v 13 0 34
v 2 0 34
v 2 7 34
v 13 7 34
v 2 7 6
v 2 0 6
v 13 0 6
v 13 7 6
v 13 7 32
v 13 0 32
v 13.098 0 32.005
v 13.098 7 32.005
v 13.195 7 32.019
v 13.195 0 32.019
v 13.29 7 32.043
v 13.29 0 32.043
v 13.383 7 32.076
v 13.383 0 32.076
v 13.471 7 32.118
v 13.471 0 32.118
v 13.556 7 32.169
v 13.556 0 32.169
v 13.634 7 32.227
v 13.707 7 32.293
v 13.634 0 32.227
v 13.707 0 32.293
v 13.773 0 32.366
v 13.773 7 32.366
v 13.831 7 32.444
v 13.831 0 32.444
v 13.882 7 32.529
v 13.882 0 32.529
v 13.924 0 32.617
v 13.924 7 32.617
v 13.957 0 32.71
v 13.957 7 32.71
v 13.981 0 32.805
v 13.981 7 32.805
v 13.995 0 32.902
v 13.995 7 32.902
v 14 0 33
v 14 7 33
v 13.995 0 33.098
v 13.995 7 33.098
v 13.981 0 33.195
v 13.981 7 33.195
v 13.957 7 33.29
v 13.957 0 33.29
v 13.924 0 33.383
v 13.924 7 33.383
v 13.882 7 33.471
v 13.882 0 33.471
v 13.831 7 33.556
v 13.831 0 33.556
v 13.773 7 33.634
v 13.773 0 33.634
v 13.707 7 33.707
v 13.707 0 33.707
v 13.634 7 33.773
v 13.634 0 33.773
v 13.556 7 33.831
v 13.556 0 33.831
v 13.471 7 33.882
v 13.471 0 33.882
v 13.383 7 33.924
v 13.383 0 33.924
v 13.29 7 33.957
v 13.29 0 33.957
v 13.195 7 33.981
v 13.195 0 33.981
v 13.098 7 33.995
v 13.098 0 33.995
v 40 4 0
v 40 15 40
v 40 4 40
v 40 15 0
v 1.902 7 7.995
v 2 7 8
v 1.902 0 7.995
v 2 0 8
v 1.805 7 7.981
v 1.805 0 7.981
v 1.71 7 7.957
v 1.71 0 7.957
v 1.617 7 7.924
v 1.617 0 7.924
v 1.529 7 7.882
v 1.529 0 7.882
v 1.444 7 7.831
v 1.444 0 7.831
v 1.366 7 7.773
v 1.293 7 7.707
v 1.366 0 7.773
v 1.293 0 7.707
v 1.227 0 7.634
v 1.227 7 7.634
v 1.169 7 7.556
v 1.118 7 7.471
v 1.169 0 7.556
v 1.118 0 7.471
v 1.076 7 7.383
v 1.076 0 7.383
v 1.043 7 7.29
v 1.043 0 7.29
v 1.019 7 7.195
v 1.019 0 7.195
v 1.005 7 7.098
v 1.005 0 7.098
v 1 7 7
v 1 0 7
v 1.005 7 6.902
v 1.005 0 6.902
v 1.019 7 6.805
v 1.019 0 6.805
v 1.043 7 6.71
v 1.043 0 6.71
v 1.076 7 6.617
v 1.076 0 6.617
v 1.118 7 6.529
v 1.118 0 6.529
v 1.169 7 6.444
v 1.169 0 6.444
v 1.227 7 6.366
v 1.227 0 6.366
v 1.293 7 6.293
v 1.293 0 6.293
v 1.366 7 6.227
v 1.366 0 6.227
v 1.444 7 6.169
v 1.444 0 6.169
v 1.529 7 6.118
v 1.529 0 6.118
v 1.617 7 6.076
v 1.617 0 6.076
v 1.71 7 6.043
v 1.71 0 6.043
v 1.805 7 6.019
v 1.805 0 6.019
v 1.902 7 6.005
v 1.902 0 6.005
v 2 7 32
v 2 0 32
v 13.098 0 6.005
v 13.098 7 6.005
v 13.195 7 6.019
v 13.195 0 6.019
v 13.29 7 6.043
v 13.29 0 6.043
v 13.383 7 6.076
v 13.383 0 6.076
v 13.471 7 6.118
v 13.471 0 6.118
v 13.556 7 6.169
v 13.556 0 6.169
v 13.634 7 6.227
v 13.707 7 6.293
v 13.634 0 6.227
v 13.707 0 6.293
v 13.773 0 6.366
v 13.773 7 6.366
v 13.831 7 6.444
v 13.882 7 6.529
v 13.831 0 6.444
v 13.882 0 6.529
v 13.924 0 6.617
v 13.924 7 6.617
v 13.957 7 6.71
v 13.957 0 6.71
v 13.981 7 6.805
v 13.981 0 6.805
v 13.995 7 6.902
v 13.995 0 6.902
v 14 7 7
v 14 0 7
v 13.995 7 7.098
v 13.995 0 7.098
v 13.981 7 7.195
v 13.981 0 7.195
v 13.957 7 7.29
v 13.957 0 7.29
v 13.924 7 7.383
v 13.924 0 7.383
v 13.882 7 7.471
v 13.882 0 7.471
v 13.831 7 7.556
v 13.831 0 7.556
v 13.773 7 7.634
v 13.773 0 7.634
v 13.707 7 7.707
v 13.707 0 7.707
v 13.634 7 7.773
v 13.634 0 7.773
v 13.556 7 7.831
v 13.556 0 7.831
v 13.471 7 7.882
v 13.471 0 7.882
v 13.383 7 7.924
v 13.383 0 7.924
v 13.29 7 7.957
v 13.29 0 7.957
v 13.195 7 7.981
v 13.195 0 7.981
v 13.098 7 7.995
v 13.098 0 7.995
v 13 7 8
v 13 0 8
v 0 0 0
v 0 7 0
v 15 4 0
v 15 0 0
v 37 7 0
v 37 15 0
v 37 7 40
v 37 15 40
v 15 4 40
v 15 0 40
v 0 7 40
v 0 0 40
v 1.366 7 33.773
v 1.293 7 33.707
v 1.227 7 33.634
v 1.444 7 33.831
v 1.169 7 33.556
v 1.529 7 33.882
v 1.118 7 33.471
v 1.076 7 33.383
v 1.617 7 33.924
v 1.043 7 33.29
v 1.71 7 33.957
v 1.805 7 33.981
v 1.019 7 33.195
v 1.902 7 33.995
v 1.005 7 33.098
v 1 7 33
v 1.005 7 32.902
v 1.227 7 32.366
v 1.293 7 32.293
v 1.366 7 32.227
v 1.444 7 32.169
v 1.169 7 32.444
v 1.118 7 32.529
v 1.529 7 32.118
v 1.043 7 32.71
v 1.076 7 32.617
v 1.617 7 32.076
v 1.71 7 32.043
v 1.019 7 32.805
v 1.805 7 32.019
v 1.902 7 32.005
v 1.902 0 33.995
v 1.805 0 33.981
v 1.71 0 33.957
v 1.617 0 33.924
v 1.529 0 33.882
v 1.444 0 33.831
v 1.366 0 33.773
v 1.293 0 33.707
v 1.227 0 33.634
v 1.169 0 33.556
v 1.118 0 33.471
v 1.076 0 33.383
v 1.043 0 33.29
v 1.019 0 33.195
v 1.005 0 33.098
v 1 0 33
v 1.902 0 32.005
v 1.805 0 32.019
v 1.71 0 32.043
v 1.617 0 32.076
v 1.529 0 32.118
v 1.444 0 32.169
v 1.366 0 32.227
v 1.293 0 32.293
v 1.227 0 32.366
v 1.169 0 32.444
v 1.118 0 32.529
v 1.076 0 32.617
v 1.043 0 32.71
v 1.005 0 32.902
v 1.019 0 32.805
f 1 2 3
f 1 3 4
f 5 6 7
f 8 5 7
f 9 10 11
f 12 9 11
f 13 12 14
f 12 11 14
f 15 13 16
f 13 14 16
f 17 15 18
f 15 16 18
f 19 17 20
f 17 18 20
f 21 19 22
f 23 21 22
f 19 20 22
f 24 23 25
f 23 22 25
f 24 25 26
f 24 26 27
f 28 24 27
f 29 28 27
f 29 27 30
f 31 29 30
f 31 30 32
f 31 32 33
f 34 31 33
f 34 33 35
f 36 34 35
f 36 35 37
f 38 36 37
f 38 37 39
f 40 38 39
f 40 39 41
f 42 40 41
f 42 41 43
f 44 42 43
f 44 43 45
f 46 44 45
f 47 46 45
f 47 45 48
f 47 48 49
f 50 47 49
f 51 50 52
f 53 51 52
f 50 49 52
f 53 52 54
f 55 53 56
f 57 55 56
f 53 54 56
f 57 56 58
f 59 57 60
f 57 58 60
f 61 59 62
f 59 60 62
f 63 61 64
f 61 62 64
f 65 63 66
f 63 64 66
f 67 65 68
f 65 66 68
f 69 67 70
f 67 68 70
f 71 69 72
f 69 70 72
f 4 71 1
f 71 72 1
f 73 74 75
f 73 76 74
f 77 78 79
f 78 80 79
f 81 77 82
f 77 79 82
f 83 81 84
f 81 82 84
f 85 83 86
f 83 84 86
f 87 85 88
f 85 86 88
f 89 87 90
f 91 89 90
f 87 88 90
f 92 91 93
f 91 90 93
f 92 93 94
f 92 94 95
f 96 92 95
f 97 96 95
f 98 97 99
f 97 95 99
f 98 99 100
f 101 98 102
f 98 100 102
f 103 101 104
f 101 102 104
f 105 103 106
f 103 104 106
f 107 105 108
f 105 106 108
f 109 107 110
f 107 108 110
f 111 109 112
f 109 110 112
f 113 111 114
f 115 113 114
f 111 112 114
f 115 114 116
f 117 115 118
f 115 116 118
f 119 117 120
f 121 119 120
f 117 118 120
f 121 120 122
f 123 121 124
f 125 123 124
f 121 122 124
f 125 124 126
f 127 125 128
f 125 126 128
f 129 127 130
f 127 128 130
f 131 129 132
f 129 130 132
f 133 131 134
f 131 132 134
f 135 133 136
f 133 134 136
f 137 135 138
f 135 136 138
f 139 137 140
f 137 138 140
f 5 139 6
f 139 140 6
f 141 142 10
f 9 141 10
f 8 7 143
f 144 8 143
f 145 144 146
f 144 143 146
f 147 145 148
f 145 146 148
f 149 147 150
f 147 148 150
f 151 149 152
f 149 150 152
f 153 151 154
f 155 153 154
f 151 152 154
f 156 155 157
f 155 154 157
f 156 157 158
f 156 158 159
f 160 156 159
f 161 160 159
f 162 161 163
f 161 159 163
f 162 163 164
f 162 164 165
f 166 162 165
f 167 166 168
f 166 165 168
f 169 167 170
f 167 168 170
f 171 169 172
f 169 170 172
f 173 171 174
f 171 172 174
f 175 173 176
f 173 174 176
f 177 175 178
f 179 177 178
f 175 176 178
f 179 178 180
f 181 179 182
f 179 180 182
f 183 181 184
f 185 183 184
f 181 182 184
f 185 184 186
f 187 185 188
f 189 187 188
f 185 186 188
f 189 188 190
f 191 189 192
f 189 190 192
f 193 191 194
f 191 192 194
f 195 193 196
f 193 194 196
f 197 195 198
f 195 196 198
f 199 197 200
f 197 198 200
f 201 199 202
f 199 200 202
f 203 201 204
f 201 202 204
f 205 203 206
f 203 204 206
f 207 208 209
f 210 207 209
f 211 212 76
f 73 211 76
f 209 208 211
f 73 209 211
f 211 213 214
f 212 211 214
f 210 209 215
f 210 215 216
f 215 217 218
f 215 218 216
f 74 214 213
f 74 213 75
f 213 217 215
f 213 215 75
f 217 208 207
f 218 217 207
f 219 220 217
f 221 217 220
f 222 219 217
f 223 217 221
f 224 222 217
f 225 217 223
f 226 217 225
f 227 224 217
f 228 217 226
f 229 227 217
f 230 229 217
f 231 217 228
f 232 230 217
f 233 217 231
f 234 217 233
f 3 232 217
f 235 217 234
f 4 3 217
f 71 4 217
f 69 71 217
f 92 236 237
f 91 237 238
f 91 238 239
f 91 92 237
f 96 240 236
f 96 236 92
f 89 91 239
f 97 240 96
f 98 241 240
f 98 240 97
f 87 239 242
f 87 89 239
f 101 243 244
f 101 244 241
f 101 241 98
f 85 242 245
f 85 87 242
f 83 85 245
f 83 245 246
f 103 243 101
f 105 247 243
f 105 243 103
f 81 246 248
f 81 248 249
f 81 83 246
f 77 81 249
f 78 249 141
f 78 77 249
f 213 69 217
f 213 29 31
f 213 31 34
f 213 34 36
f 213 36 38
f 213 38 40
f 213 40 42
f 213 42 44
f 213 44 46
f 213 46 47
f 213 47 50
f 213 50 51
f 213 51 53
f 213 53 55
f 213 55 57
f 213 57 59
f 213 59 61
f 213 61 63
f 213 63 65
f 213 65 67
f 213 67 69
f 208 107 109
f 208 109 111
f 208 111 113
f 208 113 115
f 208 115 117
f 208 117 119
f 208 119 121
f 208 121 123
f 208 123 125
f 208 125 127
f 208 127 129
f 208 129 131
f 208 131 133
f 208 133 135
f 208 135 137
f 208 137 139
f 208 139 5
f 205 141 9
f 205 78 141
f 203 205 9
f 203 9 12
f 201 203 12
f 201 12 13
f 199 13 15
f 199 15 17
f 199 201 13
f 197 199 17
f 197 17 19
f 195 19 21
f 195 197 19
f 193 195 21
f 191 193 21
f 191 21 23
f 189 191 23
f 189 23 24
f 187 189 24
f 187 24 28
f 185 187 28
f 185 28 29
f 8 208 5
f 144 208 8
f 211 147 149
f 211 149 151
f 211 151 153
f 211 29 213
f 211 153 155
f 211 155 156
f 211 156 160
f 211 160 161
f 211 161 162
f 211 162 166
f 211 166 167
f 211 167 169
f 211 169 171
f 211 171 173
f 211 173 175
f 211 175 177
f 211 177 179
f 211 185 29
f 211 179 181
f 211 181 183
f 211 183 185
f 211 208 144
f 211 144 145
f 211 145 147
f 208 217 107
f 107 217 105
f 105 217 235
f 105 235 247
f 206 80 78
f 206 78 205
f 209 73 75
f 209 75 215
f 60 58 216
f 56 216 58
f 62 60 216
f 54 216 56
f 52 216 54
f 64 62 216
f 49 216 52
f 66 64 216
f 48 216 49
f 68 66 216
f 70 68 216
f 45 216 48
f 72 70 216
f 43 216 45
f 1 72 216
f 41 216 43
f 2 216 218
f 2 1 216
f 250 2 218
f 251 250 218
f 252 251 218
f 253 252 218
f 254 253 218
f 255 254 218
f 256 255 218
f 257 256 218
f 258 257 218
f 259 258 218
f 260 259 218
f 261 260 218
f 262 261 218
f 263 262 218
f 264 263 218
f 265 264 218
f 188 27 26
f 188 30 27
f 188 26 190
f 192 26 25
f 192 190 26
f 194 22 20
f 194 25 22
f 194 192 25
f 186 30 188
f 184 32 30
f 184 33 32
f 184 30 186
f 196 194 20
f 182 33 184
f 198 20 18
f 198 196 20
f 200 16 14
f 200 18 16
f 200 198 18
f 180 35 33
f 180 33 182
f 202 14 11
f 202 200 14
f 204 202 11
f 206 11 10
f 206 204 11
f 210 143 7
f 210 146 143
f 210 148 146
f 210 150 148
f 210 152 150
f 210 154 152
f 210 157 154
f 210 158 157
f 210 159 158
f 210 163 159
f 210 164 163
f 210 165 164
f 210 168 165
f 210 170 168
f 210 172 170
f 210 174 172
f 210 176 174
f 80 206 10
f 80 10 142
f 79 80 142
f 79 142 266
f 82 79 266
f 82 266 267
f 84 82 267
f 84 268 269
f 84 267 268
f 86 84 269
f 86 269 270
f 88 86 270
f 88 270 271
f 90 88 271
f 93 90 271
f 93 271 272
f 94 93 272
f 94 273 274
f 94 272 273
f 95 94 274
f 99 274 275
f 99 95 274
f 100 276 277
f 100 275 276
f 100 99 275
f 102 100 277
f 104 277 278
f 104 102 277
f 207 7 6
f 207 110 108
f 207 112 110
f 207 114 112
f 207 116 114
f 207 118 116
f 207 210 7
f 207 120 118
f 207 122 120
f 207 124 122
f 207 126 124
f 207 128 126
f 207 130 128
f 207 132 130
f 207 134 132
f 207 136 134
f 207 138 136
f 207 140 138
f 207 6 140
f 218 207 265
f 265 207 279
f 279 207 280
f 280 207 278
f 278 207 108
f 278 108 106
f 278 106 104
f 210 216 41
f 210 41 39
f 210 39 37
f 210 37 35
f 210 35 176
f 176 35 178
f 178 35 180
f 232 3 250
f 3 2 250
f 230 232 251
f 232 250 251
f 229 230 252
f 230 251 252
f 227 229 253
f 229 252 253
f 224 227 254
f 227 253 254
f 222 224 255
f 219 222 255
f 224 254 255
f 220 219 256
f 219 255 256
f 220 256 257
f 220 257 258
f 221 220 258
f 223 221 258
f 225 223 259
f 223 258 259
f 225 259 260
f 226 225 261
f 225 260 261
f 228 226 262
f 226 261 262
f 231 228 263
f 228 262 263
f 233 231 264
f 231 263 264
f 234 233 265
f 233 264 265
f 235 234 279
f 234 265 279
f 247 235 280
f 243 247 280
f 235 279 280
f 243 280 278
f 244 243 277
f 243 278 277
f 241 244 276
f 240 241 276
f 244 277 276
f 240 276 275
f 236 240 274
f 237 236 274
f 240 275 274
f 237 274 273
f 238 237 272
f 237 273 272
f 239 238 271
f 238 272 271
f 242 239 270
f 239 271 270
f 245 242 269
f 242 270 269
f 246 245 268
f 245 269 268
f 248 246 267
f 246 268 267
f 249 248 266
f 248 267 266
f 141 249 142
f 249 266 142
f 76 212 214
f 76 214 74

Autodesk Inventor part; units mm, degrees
ref_plane "YZ Plane" through (0, 0, 0) normal (1, 0, 0) x (0, 1, 0)
ref_plane "XZ Plane" through (0, 0, 0) normal (0, 1, 0) x (-1, 0, 0)
ref_plane "XY Plane" through (0, 0, 0) normal (0, 0, 1) x (1, 0, 0)
sketch "Sketch1" plane through (0, 0, 0) normal (0, 0, 1) x (1, 0, 0)
  line L0 (0, 0) -> (0, 15) construction
  line L1 (0, 15) -> (40, 15) construction
  line L2 (40, 15) -> (40, 4)
  line L3 (40, 4) -> (15, 4)
  line L4 (15, 4) -> (15, 0)
  line L5 (15, 0) -> (0, 0)
  line L6 (0, 7) -> (37, 7)
  line L7 (37, 7) -> (37, 15)
  line L8 (37, 15) -> (40, 15)
  line L9 (0, 7) -> (0, 0)
  dimension "d0" = 4
  dimension "d1" = 15
  dimension "d2" = 15
  dimension "d5" = 3
  dimension "d6" = 3
  dimension "d12" = 40
extrude "Extrusion1" add sketch "Sketch1" along normal blind 40
sketch "Sketch2" plane through (0, 0, 0) normal (0, -1, 0) x (1, 0, 0)
  line L0 (0, 0) -> (0, 40) projected
  line L1 (15, 0) -> (15, 40) projected
  line L2 (0, 20) -> (15, 20) construction
  line L3 (0, 33) -> (15, 33) construction
  arc A0 (2, 34) -> (2, 32) centre (2, 33) ccw
  arc A1 (13, 32) -> (13, 34) centre (13, 33) ccw
  line L4 (2, 34) -> (13, 34)
  line L5 (2, 32) -> (13, 32)
  line L6 (0, 7) -> (15, 7) construction
  arc A2 (2, 8) -> (2, 6) centre (2, 7) ccw
  arc A3 (13, 6) -> (13, 8) centre (13, 7) ccw
  line L7 (2, 6) -> (13, 6)
  line L8 (2, 8) -> (13, 8)
  dimension "d7" = 2
  dimension "d8" = 2
  dimension "d9" = 2
  dimension "d13" = 13
extrude "Extrusion2" cut sketch "Sketch2" against normal blind 30
properties part number "Guide"
